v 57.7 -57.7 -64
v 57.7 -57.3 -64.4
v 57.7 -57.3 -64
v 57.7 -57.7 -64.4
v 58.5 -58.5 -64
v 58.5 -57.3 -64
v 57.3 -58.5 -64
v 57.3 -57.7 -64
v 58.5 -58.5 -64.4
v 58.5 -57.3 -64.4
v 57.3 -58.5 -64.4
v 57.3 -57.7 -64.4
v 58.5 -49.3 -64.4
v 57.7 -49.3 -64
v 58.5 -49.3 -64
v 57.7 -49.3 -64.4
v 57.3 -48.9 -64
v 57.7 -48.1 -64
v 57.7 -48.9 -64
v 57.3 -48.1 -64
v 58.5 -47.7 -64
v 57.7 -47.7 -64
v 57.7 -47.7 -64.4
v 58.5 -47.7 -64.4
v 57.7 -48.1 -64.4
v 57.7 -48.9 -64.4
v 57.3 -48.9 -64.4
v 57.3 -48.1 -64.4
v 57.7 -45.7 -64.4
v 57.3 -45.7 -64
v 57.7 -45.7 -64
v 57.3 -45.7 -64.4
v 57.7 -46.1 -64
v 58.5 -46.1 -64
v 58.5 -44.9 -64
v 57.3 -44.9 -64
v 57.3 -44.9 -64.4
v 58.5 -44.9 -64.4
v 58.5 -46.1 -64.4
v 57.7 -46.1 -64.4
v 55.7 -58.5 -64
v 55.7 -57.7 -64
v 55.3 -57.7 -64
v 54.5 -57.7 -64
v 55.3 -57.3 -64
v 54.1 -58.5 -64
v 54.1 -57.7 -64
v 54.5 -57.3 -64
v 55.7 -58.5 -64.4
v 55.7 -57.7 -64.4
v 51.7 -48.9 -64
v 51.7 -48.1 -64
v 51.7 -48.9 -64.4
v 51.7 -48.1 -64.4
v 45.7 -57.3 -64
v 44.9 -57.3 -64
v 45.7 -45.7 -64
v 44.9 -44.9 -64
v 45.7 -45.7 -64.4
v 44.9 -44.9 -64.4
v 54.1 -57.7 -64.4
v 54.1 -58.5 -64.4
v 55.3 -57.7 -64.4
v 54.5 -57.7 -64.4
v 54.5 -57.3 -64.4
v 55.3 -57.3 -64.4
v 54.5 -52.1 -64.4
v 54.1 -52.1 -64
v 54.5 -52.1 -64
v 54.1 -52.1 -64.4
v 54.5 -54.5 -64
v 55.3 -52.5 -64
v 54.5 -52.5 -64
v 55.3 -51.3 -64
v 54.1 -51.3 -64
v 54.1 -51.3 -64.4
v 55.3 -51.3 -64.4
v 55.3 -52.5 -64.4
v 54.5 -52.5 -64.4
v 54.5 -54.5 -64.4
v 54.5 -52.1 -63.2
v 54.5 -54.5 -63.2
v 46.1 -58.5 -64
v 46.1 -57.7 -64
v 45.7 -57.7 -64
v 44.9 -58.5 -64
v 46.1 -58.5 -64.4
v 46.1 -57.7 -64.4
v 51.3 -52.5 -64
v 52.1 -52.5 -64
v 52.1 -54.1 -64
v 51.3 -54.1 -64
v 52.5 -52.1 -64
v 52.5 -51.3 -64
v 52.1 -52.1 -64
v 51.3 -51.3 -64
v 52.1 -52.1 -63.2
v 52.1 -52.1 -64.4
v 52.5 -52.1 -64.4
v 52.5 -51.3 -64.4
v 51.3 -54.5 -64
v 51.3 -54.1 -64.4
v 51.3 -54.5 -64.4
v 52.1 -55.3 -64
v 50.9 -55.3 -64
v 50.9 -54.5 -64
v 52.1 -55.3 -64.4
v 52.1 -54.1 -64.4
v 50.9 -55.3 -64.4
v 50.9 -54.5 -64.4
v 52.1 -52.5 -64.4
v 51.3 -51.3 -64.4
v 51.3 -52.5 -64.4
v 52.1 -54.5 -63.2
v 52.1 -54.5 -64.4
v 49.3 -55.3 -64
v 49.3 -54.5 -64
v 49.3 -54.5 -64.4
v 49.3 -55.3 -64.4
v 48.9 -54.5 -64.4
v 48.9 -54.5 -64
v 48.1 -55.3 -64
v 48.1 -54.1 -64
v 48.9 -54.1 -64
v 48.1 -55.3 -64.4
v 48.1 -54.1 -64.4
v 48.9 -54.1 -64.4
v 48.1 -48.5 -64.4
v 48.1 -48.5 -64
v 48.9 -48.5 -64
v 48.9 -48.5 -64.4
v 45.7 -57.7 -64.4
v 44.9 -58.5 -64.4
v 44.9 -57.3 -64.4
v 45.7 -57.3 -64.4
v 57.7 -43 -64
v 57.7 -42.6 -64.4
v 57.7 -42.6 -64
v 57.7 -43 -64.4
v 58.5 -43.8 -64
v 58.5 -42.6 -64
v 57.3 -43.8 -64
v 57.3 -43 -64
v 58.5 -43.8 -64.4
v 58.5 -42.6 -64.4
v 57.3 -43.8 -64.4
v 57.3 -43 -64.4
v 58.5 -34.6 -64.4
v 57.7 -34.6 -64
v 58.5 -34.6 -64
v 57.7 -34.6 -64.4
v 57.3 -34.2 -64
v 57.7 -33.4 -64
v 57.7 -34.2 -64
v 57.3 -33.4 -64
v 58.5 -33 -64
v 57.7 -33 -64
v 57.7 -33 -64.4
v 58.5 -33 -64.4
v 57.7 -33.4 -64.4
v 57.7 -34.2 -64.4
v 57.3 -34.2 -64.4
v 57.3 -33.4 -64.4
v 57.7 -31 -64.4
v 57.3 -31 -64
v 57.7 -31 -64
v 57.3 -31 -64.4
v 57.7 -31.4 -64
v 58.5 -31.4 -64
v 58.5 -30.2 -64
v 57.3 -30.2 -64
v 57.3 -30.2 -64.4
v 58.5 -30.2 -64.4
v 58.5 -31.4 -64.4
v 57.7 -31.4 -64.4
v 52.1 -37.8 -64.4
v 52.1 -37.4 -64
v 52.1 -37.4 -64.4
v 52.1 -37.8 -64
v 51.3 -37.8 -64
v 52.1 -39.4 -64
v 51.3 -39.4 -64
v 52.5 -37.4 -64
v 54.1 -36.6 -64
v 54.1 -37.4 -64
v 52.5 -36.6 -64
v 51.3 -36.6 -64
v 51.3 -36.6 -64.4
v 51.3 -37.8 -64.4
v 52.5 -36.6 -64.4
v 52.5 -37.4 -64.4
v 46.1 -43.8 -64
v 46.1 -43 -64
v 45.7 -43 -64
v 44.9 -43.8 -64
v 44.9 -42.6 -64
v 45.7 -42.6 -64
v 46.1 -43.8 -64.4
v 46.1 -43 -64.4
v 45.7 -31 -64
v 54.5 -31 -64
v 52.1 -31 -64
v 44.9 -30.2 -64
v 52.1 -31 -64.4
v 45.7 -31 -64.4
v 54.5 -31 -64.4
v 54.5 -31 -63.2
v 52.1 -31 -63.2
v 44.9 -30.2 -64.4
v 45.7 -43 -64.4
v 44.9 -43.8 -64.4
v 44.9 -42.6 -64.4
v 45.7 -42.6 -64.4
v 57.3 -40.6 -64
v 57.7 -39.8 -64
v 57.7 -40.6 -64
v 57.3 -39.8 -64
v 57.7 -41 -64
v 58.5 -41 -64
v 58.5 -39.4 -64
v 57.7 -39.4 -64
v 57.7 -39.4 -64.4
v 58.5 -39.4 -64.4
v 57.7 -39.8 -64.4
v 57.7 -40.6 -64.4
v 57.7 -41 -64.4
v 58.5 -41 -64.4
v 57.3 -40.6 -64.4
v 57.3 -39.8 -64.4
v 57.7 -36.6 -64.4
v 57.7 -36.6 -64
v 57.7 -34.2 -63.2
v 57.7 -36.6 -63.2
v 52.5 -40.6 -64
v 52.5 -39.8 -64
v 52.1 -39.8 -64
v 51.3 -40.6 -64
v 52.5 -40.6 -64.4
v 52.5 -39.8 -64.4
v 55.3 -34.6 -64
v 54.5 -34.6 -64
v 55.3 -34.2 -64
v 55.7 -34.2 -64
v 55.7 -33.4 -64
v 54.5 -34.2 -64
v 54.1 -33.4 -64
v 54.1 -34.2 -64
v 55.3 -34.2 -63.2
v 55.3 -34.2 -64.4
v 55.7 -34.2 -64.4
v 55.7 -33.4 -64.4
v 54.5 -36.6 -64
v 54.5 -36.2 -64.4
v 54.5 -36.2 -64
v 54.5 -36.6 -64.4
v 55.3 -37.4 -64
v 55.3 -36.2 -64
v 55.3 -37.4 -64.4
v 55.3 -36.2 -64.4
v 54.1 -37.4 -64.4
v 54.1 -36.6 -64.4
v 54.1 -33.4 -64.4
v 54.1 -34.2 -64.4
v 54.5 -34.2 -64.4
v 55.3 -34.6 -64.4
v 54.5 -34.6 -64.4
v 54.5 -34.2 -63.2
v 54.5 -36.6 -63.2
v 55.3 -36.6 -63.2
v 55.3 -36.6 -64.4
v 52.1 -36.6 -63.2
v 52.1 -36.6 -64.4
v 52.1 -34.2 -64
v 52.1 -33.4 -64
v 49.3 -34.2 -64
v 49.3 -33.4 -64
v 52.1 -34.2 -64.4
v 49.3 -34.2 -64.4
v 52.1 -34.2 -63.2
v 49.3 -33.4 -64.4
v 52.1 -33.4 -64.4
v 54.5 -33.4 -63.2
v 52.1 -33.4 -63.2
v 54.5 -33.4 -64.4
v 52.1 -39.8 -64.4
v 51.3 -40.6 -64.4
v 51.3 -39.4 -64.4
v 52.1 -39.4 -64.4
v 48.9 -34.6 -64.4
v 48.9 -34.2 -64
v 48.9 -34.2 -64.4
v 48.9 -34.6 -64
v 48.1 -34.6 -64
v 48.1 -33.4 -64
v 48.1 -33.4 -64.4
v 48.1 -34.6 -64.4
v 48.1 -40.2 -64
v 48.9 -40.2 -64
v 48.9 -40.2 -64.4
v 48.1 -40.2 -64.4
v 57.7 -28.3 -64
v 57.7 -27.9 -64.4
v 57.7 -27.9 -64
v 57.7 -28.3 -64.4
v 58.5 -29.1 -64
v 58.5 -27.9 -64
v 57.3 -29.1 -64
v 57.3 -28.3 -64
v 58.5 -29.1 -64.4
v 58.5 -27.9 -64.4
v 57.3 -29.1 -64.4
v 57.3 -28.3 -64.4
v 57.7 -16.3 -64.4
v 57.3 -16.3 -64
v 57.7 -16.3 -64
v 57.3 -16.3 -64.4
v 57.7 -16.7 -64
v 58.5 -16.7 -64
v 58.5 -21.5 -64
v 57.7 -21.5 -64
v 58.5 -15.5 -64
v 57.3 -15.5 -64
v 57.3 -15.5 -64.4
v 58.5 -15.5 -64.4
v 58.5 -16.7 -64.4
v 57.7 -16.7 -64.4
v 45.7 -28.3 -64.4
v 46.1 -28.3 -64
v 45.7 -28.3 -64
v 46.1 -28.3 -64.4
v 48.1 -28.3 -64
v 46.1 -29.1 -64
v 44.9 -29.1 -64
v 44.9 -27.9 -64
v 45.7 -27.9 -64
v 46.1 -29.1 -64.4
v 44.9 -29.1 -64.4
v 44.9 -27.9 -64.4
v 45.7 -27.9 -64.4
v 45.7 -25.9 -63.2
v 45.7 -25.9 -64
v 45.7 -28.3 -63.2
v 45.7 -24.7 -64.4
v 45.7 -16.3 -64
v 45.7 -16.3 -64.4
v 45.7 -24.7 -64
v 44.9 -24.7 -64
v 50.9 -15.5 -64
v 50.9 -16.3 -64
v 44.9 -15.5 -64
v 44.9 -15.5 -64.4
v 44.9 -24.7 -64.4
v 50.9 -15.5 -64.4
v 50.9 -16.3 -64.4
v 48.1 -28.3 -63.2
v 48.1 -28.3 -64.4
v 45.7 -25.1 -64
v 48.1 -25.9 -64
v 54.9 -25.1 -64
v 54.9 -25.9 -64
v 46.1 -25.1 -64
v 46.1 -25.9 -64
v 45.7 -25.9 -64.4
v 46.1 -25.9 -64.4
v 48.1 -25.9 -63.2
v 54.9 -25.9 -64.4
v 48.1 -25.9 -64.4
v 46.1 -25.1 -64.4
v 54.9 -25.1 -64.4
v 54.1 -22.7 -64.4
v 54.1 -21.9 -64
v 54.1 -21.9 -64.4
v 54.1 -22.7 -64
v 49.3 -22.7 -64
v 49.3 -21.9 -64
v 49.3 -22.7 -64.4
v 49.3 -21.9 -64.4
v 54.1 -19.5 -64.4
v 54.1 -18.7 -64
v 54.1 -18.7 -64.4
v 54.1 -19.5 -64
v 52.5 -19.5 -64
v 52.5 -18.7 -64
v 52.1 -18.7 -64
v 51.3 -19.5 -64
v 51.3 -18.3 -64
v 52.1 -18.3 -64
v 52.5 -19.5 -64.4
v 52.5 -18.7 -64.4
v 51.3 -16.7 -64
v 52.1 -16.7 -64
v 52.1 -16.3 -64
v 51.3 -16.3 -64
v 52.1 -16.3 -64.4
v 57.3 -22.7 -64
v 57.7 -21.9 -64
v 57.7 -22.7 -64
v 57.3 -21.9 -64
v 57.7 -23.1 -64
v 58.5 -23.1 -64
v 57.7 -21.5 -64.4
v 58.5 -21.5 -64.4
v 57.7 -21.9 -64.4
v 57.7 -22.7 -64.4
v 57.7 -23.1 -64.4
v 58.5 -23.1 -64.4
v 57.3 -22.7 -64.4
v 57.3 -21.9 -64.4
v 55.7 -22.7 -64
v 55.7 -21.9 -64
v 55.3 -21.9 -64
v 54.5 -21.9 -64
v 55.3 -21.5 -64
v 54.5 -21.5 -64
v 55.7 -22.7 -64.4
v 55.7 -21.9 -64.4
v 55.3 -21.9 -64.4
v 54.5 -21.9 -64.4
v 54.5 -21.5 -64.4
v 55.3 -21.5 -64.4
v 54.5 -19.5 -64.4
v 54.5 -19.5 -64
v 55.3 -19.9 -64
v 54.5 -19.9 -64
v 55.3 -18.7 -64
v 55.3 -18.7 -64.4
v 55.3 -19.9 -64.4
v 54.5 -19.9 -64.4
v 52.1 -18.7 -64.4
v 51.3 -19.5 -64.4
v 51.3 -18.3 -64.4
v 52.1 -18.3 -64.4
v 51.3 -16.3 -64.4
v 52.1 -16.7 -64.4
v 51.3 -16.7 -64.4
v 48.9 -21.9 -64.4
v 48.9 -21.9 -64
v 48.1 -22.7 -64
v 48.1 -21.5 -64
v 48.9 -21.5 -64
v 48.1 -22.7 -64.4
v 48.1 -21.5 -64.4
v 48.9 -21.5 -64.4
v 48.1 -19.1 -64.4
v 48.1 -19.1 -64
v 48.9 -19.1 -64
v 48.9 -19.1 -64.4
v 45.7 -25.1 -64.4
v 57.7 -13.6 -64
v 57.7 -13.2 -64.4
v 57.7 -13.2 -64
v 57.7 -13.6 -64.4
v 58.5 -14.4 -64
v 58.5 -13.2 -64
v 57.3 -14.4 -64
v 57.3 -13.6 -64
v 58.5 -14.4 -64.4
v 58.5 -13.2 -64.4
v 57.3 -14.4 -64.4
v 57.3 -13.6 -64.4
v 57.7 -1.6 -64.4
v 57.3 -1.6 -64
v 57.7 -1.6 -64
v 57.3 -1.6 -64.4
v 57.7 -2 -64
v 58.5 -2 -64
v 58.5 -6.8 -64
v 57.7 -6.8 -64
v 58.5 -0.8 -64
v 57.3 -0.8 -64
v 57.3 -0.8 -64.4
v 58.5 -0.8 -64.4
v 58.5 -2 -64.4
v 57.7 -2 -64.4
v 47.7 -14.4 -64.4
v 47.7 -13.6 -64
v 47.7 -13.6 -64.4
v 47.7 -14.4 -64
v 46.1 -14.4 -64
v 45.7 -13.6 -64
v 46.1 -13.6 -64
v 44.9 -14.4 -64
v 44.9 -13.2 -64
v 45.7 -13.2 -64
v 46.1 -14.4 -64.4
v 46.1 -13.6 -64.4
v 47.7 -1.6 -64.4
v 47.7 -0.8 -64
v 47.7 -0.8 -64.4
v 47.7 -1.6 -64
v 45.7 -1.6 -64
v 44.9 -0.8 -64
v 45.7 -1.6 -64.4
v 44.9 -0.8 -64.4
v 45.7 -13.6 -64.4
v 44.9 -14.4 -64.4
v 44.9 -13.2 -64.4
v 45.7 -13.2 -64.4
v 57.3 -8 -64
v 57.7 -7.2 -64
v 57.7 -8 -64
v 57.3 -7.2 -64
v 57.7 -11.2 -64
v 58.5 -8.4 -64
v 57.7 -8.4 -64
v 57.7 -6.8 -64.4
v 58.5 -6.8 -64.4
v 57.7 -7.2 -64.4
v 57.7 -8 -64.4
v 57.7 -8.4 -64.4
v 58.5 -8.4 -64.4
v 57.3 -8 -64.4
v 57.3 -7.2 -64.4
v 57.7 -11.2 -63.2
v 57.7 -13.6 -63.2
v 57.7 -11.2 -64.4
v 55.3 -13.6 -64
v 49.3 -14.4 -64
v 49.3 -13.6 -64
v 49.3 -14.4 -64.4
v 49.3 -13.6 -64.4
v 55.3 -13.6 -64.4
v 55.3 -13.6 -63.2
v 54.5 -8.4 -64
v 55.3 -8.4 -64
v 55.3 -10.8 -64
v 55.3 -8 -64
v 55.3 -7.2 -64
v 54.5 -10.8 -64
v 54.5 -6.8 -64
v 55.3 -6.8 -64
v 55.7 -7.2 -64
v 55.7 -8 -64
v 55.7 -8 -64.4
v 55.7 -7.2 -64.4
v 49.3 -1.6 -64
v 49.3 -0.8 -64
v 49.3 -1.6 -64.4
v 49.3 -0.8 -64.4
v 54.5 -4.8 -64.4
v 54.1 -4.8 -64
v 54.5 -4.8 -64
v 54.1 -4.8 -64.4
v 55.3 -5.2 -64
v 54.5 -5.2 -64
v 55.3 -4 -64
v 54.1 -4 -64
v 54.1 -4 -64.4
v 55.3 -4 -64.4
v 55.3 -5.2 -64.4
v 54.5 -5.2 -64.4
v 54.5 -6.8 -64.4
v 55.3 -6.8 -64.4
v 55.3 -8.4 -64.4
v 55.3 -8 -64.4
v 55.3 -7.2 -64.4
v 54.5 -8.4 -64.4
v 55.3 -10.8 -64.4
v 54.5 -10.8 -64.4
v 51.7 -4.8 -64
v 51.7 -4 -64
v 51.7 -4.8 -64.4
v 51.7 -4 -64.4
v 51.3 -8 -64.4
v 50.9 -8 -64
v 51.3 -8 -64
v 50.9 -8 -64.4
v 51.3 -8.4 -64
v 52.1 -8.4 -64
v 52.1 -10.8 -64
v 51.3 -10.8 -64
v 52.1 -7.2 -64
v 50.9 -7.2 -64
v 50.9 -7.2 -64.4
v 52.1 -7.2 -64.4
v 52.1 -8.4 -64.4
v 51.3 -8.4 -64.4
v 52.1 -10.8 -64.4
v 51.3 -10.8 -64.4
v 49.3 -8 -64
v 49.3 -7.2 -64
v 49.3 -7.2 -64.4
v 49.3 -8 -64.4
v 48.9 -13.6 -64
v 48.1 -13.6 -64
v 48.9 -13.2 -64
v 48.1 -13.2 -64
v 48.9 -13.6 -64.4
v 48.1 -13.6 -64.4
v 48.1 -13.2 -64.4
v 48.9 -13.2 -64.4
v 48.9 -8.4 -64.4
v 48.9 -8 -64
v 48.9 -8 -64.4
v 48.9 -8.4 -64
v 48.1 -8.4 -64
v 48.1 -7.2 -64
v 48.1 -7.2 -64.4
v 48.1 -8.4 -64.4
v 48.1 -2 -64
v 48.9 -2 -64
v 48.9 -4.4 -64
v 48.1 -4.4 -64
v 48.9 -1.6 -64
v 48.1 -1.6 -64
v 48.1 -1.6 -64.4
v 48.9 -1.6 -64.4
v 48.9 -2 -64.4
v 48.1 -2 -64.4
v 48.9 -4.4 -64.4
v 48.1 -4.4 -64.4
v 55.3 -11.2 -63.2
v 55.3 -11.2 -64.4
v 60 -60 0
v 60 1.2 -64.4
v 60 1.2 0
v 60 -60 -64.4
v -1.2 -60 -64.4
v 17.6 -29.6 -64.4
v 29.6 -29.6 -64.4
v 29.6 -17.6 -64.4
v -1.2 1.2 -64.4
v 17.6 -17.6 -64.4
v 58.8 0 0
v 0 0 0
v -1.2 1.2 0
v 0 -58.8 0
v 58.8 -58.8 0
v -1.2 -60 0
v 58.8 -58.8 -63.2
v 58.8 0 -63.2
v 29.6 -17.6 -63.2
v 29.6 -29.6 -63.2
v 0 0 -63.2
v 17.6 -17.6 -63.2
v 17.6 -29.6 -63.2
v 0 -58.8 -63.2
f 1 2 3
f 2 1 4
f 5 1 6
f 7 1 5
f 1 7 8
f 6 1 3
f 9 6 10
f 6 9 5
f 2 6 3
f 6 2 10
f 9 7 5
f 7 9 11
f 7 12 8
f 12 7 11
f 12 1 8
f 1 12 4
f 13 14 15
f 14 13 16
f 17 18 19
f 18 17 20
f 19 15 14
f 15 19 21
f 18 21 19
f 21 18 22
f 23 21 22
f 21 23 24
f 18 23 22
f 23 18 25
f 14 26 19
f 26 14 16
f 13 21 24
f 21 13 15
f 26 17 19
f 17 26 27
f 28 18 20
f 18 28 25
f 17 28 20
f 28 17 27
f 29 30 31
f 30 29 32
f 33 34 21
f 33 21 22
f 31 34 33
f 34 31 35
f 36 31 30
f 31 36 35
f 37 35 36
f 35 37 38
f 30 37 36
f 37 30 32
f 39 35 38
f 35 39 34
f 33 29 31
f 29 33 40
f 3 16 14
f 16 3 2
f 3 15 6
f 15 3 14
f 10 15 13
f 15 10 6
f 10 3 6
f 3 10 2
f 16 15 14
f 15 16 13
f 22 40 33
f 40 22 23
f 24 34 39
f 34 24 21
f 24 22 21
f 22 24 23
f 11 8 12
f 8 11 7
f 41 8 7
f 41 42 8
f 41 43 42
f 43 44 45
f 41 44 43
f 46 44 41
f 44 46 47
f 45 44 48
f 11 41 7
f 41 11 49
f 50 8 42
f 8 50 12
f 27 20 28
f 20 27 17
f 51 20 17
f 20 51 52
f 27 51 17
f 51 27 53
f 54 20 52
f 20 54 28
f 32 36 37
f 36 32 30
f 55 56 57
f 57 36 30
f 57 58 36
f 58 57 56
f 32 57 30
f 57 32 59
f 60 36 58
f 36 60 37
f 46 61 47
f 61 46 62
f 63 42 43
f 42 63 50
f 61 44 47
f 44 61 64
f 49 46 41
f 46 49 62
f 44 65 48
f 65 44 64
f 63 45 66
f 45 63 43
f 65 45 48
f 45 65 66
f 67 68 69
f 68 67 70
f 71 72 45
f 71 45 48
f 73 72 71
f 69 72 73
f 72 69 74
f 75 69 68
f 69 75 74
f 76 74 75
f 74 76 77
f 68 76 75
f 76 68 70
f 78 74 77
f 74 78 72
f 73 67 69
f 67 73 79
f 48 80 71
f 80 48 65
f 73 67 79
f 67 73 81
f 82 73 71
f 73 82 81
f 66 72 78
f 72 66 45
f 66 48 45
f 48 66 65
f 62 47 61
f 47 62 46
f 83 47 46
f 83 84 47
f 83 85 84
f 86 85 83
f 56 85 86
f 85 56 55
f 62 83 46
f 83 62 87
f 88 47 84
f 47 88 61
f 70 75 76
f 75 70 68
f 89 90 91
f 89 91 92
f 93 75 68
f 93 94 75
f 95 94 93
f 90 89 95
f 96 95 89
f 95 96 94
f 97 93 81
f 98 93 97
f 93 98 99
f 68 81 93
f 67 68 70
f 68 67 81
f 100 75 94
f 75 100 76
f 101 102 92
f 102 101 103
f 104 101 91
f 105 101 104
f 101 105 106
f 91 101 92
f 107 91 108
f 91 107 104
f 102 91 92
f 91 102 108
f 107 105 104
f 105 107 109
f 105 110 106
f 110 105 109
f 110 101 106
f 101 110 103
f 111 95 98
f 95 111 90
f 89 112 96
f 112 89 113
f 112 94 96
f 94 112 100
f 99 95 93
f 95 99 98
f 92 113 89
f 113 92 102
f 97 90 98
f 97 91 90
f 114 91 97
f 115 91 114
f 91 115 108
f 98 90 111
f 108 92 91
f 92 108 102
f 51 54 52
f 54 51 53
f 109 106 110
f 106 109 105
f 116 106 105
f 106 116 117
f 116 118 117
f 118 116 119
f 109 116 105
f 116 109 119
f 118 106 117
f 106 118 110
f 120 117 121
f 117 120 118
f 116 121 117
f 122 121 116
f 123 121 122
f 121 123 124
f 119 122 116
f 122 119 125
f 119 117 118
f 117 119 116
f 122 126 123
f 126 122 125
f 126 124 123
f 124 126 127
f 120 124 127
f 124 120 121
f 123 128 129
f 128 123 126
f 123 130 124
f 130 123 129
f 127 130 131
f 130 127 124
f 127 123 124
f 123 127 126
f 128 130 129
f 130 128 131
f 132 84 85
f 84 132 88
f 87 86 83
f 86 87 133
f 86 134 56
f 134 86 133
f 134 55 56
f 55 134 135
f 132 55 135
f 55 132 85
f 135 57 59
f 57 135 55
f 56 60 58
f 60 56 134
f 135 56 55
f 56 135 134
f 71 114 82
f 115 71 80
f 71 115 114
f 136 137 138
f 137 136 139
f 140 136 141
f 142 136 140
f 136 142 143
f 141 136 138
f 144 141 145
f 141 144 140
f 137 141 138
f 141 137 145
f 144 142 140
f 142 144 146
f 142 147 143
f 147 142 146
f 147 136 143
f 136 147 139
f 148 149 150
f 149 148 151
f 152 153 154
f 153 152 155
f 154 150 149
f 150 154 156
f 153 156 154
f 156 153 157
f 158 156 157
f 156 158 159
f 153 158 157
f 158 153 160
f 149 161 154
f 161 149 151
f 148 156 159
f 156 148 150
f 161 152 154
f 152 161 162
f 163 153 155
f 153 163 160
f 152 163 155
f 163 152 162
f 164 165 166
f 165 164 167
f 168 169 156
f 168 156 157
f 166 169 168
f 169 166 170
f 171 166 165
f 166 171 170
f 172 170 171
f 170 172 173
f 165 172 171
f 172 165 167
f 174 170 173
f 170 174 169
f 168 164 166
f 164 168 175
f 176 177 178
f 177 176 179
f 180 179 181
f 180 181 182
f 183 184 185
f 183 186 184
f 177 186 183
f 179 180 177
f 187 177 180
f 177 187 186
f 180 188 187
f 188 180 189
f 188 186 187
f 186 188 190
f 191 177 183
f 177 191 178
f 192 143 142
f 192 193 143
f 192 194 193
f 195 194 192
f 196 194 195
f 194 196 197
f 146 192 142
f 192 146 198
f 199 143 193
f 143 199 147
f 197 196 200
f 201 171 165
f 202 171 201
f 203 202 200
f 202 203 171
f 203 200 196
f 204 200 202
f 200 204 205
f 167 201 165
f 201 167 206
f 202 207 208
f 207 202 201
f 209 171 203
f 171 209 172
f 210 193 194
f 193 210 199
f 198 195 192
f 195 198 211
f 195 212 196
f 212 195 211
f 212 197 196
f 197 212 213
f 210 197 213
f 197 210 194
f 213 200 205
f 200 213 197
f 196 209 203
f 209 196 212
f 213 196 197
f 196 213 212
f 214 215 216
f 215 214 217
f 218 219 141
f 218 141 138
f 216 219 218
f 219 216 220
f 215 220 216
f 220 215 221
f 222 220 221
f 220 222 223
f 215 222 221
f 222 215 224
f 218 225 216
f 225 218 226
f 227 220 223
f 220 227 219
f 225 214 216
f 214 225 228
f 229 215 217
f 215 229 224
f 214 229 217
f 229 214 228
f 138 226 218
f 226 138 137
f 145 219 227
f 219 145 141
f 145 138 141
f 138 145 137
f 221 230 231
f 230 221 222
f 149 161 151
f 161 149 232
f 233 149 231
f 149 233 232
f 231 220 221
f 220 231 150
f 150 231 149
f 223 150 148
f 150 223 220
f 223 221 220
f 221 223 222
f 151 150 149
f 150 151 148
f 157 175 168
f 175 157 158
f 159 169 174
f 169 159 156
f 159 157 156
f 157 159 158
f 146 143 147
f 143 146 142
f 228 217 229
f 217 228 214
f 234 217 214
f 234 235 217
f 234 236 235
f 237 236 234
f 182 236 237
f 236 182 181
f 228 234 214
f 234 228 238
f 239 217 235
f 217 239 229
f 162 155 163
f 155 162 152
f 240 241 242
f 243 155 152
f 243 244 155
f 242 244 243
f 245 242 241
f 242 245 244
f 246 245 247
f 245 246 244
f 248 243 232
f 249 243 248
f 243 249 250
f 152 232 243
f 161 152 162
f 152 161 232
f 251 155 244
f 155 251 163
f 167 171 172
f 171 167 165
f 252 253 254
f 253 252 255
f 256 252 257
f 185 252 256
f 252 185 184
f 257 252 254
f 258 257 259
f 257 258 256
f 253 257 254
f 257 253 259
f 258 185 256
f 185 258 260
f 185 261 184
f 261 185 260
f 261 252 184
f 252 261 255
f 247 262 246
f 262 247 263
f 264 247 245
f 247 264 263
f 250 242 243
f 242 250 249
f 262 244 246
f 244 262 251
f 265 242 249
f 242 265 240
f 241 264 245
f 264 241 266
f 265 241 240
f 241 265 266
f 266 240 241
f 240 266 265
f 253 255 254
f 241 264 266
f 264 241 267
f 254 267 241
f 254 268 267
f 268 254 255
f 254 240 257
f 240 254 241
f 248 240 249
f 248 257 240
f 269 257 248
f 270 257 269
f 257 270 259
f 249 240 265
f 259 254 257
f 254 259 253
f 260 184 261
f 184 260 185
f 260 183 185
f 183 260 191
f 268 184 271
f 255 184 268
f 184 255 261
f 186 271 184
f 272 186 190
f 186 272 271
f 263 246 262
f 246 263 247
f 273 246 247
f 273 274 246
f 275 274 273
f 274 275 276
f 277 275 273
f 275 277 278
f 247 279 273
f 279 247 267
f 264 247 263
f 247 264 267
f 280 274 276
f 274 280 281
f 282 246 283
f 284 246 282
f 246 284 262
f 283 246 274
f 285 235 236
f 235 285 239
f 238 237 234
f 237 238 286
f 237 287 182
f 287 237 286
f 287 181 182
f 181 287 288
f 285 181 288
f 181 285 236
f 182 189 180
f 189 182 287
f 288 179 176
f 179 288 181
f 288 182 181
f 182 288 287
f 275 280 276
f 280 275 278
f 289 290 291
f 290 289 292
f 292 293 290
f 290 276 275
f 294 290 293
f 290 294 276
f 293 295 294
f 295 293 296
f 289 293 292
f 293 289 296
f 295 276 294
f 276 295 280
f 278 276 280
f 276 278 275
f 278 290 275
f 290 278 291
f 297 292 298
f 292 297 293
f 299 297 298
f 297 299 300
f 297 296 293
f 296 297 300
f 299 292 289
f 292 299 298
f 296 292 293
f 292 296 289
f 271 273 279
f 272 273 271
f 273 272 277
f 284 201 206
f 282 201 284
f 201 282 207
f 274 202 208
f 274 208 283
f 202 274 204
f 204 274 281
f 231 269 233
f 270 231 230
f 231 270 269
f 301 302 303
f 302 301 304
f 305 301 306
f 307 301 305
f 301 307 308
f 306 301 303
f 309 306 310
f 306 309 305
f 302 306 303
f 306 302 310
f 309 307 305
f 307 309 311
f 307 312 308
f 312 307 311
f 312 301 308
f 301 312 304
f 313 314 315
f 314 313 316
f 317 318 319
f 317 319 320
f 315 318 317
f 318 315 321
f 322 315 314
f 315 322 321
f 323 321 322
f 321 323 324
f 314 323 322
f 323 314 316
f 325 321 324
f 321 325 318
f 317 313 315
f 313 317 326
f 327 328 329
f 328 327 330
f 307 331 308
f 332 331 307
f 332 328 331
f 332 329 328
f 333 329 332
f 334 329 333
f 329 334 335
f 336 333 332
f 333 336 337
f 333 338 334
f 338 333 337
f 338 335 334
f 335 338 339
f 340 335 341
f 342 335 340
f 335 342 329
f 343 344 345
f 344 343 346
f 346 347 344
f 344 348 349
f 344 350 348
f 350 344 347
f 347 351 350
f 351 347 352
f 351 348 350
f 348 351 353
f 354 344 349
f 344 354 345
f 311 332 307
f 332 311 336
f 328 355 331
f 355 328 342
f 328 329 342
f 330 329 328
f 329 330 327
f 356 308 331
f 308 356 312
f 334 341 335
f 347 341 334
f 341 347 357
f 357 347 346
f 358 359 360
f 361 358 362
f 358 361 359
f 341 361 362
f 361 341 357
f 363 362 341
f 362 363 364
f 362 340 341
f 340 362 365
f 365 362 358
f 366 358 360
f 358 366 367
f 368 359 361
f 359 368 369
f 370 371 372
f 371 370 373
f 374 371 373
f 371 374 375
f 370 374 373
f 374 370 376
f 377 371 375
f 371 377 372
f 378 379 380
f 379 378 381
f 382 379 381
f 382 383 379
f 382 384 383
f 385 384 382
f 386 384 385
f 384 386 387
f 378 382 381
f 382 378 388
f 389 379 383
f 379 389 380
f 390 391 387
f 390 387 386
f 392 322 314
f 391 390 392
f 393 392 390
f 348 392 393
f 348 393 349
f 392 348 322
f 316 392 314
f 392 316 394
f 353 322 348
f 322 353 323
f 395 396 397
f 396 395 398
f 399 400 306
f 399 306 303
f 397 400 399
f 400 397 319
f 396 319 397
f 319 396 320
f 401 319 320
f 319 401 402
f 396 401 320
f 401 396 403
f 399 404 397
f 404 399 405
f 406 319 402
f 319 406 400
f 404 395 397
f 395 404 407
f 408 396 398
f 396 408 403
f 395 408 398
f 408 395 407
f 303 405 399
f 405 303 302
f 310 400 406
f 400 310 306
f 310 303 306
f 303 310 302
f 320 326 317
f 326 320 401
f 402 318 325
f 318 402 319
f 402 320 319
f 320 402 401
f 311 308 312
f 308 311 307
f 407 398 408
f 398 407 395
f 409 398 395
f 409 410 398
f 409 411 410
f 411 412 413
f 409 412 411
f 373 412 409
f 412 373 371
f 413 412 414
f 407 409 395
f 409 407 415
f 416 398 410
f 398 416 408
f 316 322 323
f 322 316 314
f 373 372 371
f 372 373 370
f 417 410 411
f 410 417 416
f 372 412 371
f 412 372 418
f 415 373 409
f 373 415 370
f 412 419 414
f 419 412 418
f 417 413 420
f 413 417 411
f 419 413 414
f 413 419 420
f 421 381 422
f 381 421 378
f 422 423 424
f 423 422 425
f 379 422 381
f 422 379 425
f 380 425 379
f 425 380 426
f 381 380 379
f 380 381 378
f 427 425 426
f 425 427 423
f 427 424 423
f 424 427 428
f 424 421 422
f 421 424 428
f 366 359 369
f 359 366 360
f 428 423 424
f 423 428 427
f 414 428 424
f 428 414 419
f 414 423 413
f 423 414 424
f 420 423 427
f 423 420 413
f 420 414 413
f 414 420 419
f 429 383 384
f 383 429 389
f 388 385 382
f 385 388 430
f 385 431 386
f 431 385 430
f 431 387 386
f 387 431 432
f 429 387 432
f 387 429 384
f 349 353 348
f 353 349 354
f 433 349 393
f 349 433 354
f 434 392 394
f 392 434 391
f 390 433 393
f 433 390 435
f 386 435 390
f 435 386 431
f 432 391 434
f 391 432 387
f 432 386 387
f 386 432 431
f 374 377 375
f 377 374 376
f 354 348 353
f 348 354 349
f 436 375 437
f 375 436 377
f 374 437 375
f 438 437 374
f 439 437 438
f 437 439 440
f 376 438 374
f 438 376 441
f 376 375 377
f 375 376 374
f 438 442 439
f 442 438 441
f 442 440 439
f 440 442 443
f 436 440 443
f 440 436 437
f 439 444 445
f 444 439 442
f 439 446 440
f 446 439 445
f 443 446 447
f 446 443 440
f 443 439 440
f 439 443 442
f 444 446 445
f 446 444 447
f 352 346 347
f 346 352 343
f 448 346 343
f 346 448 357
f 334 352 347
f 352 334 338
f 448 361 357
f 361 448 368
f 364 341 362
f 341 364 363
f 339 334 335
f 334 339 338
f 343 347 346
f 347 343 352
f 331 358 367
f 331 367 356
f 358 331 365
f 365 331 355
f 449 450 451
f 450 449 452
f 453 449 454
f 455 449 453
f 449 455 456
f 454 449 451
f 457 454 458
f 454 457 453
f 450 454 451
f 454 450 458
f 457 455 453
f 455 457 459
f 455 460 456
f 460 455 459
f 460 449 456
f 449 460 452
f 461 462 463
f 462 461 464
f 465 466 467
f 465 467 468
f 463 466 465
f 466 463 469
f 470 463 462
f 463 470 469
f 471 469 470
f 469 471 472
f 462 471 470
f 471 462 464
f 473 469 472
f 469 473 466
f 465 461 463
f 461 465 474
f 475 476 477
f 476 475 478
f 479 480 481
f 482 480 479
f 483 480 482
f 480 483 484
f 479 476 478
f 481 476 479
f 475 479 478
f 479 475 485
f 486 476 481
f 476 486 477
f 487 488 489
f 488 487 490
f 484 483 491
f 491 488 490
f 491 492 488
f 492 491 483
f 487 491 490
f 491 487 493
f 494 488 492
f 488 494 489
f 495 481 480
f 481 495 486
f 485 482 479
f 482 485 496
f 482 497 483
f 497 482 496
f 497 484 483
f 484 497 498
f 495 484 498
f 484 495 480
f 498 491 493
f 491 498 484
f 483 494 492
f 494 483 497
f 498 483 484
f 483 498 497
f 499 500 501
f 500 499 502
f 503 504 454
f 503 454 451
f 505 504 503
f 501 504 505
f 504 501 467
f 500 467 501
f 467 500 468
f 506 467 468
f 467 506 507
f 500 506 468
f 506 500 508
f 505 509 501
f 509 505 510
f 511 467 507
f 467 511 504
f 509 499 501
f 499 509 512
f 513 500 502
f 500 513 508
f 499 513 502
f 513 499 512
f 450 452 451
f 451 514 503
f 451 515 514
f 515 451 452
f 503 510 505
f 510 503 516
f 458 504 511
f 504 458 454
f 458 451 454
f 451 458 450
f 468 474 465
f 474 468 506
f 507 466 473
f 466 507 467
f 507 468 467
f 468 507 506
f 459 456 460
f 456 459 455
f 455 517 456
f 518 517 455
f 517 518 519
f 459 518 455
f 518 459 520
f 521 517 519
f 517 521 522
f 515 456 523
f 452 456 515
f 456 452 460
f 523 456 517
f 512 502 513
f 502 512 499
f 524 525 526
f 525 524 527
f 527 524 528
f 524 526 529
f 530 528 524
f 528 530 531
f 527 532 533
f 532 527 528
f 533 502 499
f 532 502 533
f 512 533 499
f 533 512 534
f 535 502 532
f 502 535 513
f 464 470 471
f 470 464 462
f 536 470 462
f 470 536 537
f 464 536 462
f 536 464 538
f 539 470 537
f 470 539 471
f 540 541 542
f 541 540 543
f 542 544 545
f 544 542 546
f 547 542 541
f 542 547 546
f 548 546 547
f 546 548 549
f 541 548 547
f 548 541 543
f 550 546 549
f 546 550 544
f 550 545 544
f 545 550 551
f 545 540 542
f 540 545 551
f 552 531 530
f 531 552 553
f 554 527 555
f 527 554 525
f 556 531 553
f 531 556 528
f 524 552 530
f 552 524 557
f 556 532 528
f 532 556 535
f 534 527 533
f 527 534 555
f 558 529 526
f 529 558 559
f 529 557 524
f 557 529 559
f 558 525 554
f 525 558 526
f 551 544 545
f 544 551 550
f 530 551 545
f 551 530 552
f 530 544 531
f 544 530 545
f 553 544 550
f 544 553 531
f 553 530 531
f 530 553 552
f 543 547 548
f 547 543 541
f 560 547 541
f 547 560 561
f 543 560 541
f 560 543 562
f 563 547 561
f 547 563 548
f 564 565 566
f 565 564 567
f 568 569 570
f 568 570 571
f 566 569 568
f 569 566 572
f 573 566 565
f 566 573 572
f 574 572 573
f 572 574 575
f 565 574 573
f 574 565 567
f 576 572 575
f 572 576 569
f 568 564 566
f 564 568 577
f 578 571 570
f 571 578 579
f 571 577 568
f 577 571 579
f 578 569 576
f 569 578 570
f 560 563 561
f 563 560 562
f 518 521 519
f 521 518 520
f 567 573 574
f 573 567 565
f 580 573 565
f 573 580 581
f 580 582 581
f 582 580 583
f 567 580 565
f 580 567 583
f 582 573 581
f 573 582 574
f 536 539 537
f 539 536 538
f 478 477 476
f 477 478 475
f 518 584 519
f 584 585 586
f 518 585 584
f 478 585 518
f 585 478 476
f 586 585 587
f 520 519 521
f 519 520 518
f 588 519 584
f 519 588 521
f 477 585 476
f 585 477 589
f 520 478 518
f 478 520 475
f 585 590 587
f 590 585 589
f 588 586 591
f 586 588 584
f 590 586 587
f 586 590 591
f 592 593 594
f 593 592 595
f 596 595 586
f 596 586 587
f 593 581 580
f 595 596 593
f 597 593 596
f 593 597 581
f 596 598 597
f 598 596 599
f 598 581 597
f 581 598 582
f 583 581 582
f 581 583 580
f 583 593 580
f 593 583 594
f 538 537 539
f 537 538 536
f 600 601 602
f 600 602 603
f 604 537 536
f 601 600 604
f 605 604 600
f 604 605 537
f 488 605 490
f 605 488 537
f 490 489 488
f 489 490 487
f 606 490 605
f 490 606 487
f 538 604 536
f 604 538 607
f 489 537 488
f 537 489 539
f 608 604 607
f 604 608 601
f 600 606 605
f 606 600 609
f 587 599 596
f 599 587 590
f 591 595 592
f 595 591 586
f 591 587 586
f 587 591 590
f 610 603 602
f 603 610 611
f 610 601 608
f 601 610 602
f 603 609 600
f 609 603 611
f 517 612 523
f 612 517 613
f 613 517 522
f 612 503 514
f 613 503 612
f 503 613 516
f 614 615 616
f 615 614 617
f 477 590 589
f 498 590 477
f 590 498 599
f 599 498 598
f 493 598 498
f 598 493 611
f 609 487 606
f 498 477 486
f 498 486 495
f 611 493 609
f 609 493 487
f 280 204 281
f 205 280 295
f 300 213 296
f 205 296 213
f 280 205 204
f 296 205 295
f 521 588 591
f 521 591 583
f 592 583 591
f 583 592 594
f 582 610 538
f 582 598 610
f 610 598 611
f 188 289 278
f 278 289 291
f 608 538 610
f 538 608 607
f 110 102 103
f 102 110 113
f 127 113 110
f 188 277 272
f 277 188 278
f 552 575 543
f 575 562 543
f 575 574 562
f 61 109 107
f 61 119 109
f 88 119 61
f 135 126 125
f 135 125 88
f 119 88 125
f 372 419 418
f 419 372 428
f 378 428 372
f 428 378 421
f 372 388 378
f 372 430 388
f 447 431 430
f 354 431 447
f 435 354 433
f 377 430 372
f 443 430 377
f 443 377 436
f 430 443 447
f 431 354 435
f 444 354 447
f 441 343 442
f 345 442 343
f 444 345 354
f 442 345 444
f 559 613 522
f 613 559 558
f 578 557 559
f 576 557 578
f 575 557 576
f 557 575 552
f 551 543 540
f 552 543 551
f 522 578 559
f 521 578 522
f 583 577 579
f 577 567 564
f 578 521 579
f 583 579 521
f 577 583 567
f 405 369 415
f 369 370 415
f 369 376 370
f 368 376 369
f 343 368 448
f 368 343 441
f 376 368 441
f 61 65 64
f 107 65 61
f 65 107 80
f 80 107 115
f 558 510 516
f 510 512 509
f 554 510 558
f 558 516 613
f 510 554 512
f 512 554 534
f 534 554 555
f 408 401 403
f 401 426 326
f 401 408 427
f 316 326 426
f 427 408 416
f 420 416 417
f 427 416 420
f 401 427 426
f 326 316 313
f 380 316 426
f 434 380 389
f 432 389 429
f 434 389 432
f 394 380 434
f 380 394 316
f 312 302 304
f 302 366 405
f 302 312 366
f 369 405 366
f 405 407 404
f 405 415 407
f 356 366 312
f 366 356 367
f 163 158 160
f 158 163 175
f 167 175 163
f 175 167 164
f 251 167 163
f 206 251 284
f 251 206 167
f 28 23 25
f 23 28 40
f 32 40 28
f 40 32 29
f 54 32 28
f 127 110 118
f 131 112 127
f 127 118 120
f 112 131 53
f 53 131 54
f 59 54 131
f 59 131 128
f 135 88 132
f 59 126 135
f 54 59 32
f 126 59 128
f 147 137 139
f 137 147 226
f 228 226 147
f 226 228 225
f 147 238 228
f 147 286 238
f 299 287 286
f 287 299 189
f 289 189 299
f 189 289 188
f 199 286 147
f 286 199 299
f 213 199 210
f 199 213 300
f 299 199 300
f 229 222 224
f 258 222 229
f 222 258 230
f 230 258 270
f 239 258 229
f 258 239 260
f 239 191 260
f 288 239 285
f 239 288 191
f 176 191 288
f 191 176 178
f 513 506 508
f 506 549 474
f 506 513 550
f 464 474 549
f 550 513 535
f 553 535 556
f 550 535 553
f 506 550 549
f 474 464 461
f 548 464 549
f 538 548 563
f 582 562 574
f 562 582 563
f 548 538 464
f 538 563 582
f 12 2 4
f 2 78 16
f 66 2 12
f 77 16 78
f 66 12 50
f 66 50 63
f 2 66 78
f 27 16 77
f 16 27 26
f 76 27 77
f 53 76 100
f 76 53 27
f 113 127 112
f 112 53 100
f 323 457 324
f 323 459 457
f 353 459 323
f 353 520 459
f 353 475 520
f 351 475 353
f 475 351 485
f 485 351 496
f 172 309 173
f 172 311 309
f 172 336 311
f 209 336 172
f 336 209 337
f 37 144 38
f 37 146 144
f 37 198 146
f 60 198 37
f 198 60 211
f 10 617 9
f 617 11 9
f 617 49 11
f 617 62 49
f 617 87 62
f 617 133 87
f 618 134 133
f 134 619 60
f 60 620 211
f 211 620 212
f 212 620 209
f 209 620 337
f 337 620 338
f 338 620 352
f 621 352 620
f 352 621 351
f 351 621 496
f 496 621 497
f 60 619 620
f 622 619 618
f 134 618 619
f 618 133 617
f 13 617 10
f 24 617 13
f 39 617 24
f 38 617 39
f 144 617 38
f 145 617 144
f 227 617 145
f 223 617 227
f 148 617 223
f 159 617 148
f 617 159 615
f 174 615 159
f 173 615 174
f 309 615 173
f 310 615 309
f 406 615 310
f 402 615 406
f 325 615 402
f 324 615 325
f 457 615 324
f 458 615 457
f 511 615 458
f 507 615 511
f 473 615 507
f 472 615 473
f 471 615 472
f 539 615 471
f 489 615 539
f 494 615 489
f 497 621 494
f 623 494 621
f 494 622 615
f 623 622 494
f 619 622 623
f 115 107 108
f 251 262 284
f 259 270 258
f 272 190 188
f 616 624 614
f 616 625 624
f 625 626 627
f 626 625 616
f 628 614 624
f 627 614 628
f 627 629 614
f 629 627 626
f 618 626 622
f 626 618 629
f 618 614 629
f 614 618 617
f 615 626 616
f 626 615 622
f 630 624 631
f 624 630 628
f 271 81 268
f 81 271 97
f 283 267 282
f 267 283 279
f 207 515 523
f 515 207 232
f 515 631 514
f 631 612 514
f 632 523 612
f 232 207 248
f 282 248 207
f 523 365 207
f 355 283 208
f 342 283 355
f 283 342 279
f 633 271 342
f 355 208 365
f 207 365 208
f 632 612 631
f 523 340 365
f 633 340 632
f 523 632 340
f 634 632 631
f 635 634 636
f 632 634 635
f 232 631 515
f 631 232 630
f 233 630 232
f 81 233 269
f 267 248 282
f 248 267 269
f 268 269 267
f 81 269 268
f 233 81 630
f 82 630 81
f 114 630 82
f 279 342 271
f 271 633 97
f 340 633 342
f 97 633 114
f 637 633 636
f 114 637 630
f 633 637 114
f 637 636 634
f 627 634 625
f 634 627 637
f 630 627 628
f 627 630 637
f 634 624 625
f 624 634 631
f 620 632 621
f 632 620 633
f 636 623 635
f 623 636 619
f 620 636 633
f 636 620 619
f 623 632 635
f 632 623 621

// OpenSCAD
// file: ../../code/enclosing-box.scad
module box(levels) {
    count = len(levels);
    l1 = levels[0];
    sw = len(l1);
    extraSpace = 3*nozzleDiameter;
    bt = nozzleDiameter*3; // box wall thickness
    
    b1Xs = sw*w + extraSpace; // box inside X size
    b1Ys = b1Xs;
    b1Zs = (wh-levelOverlap)*count+levelOverlap + extraSpace;
    
    
    echo("Box insides: ", b1Xs, b1Ys, b1Zs);
    rotate([180,0,0])
    difference() {
        translate([-bt, -bt, 0])
            cube([
                b1Xs+2*bt, 
                b1Ys+2*bt, 
                b1Zs+1*bt
            ]);
        cube([b1Xs, b1Ys, b1Zs]);

        
        // hole for ball entrance
        xy=extraSpace+w/2;
        translate([xy,xy,b1Zs+bt-2*layerHeight]) {
            holes(l1, STARTING_POINT);
        }

        
        translate([0,0,b1Zs+bt-2*layerHeight]) {
            // draw levels on box
            for(i = [1:count]) {
                level = levels[i-1];
                marginX =     b1Ys/count   - extraSpace;
                marginY = (i*(b1Ys/count)) - extraSpace;
                translate([b1Xs-marginX, b1Ys-marginY, 0])
                levelContour(level, count);
            }
        }
    }   
}


module levelContour(level, count) {
    // scale down to fit all mazes into one row on top of the box
    scale(1/count) {
        // count is used in wallThickness multiplication here to compensate scale down factor
        // also, to make walls visible better, increasing adding additional multiplication factor
        walls(level, count*wallThickness); 
        holes(level, sizeScale=[0.8,0.8,2]);
    }
}
// file: ../../code/main.scad
include <enclosing-box.scad>;

// DRAWING SYMBOLS
WALL_VERTICAL = "|";
WALL_VERTICAL_TOP = "╹";
WALL_VERTICAL_BOTTOM = "╻";
WALL_HORIZONTAL = "─";
WALL_HORIZONTAL_LEFT = "╸";
WALL_HORIZONTAL_RIGHT = "╺";

CORNER_PLUS="+";

CORNER_TOP_LEFT="┌";
CORNER_TOP_RIGHT= "┐";
CORNER_BOTTOM_RIGHT="┘";
CORNER_BOTTOM_LEFT="└";

CORNER_T="┬";
CORNER_T_DOWN="┴";
CORNER_T_LEFT="├";
CORNER_T_RIGHT="┤";

SPACE = " ";
HOLE = "X";
STARTING_POINT = "O";

template3x3 = [
"┌───────┐",
"|X      |",
"| ┌─┬─┐ |",
"| | ╹ | |",
"| ├╸+╺┤ |",
"| | ╻ | |",
"| └─┴─┘ |",
"|      O|",
"└───────┘"];

// PARAMETERS
ballSize = 12;

levelOverlap = 2; // how much below level should go into the bottom plate
bpt = levelOverlap + 1; // bottom plate thickness
nozzleDiameter = 0.4;
layerHeight = 0.2;
wallThickness = nozzleDiameter*2; // wall thickness
wh = ballSize+bpt+levelOverlap; // wall height


// VARIABLES
w = ballSize/2+wallThickness/2; // width of the cell


// HELPER METHODS
module labyrinthLevels(currentLevel, levelBelow) {
    difference() {
        labyrinth(currentLevel);
        translate([0,0,-wh+levelOverlap])
            labyrinth(levelBelow, wallThickness+nozzleDiameter*2); // add extra two lines space for walls' overlap
    }
}

module labyrinth(lab, wallThickness = wallThickness) {
    bottom(lab);
    walls(lab, wallThickness);
}

module bottom(lab) {
    sw=len(lab[0]);
    boardSize = sw*w;
    difference() {
        translate([-w/2,-w/2,0])
            cube([boardSize, boardSize, bpt]);
        holes(lab);
    }
}

module walls(lab, wallThickness=wallThickness) {
    sw=len(lab[0]);
    for(x=[0:sw-1]) {
        for(y=[0:sw-1]) {
            cell = lab[x][y];
            tx=sw-x-1; ty=sw-y-1;
            translate([tx*w, ty*w, 0]) {
                if (cell == WALL_VERTICAL) {
                    wallVertical(wallThickness);
                } else if (cell == WALL_VERTICAL_TOP) {
                    wallVerticalTop(wallThickness);
                } else if (cell == WALL_VERTICAL_BOTTOM) {
                    wallVerticalBottom(wallThickness);
                } else if (cell == WALL_HORIZONTAL) {
                    wallHorizontal(wallThickness);
                } else if (cell == WALL_HORIZONTAL_LEFT) {
                    wallHorizontalLeft(wallThickness);
                } else if (cell == WALL_HORIZONTAL_RIGHT) {
                    wallHorizontalRight(wallThickness);
                } else if (cell == CORNER_TOP_LEFT) {
                    cornerTopLeft(wallThickness);
                } else if (cell == CORNER_TOP_RIGHT) {
                    cornerTopRight(wallThickness);
                } else if (cell == CORNER_BOTTOM_RIGHT) {
                    cornerBottomRight(wallThickness);
                } else if (cell == CORNER_BOTTOM_LEFT) {
                    cornerBottomLeft(wallThickness);
                } else if (cell == CORNER_T) {
                    cornerT(wallThickness);
                } else if (cell == CORNER_T_RIGHT) {
                    cornerTRight(wallThickness);
                } else if (cell == CORNER_T_DOWN) {
                    cornerTDown(wallThickness);
                } else if (cell == CORNER_T_LEFT) {
                    cornerTLeft(wallThickness);
                } else if (cell == CORNER_PLUS) {
                    cornerPlus(wallThickness);
                }
            }
        }
    }
}

module holes(lab, holeSymbol = HOLE, sizeScale=[1,1,1]) {
    sw=len(lab[0]);
    for(x=[0:sw-1]) {
        for(y=[0:sw-1]) {
            cell = lab[x][y];
            if (cell == holeSymbol) {
                tx=sw-x-1; ty=sw-y-1;
                translate([tx*w, ty*w, 0]) {
                    hole(sizeScale);
                }
            }
        }
    }
}

module hole(sizeScale=[1,1,1]) {
    s=w+w-wallThickness;
    translate([0,0, bpt/2-1])
       scale(sizeScale) cube([s, s, bpt+2], center = true);
}

module wallHorizontal(wallThickness) {
    rotate([0,0,90])
        wall(wallThickness);
}

module wallVertical(wallThickness) {
    wall(wallThickness);
}
module wallVerticalTop(wallThickness) {
    wallHalf(wallThickness);
}
module wallVerticalBottom(wallThickness) {
    rotate([0,0,180])
        wallHalf(wallThickness);
}
module wallHorizontalLeft(wallThickness) {
    rotate([0,0,90])
        wallHalf(wallThickness);
}
module wallHorizontalRight(wallThickness) {
    rotate([0,0,270])
        wallHalf(wallThickness);
}

module wall(wallThickness) {
    translate([-w/2,-wallThickness/2, 0])
        cube([w, wallThickness, wh]);
}
module wallHalf(wallThickness) {
    translate([0,-wallThickness/2, 0])
        cube([w/2, wallThickness, wh]);
}

module cornerTopLeft(wallThickness) {
    rotate([0,0,180])
        corner(wallThickness);
}
module cornerTopRight(wallThickness) {
    rotate([0,0,90])
        corner(wallThickness);
}
module cornerBottomRight(wallThickness) {
    corner(wallThickness);
}
module cornerBottomLeft(wallThickness) {
    rotate([0,0,270])
        corner(wallThickness);
}

module corner(wallThickness) {
    translate([-wallThickness/2,-wallThickness/2,0])
        cube([wallThickness, w/2+wallThickness/2, wh]);
    translate([-wallThickness/2,-wallThickness/2, 0])
        cube([w/2+wallThickness/2, wallThickness, wh]);
}

module cornerPlus(wallThickness) {
    translate([-w/2,-wallThickness/2, 0])
        cube([w, wallThickness, wh]);    
    translate([-wallThickness/2,-w/2,0])
        cube([wallThickness, w, wh]);
}

module cornerT(wallThickness) {
    rotate([0,0,90]) {
        translate([-w/2,-wallThickness/2, 0])
            cube([w, wallThickness, wh]);    
        translate([-wallThickness/2,-wallThickness/2,0])
            cube([wallThickness, w/2+wallThickness/2, wh]);
    }
}

module cornerTRight(wallThickness) {
    rotate([0,0,270])
        cornerT(wallThickness);
}

module cornerTDown(wallThickness) {
    rotate([0,0,180])
        cornerT(wallThickness);
}

module cornerTLeft(wallThickness) {
    rotate([0,0,90])
        cornerT(wallThickness);
}
// main file
include <../../code/main.scad>

//labyrinthLevels(level1, level2);
//labyrinthLevels(level2, level3);
//labyrinthLevels(level3, level4);
//labyrinth(level4);
box([level1,level2,level3,level4]);

level1 = [
"┌─────┬─┐",
"|     | |",
"├───┐ | |",
"|  X| | |",
"| ┌─┘ ╹ |",
"| |  O  |",
"| └───╸ |",
"|       |",
"└───────┘"];

level2 = [
"┌─┬───┬─┐",
"| |  X| |",
"| | ┌─┤ |",
"| |O|X|X|",
"| └─┘ | |",
"|     | |",
"| ╺───┘ |",
"|       |",
"└───────┘"];

level3 = [
"┌───┬───┐",
"|   |O  |",
"| ╻ ├─┐ |",
"| | |O|O|",
"| | | └─┤",
"| | |   |",
"| | └─╸ |",
"|X|     |",
"└─┴─────┘"];

level4 = [
"┌───┬───┐",
"|X  |   |",
"| ╺─┴─┐ |",
"|     | |",
"| ╺─┐ ╹ |",
"|   |   |",
"├───┘ ╺─┤",
"|O      |",
"└───────┘"];



template4x4 = [
"┌───────┐",
"|X      |",
"| ┌─┬─┐ |",
"| | ╹ | |",
"| ├╸+╺┤ |",
"| | ╻ | |",
"| └─┴─┘ |",
"|      O|",
"└───────┘"];

empty4x4 = [
"┌───────┐",
"|       |",
"|       |",
"|       |",
"|       |",
"|       |",
"|       |",
"|       |",
"└───────┘"];
